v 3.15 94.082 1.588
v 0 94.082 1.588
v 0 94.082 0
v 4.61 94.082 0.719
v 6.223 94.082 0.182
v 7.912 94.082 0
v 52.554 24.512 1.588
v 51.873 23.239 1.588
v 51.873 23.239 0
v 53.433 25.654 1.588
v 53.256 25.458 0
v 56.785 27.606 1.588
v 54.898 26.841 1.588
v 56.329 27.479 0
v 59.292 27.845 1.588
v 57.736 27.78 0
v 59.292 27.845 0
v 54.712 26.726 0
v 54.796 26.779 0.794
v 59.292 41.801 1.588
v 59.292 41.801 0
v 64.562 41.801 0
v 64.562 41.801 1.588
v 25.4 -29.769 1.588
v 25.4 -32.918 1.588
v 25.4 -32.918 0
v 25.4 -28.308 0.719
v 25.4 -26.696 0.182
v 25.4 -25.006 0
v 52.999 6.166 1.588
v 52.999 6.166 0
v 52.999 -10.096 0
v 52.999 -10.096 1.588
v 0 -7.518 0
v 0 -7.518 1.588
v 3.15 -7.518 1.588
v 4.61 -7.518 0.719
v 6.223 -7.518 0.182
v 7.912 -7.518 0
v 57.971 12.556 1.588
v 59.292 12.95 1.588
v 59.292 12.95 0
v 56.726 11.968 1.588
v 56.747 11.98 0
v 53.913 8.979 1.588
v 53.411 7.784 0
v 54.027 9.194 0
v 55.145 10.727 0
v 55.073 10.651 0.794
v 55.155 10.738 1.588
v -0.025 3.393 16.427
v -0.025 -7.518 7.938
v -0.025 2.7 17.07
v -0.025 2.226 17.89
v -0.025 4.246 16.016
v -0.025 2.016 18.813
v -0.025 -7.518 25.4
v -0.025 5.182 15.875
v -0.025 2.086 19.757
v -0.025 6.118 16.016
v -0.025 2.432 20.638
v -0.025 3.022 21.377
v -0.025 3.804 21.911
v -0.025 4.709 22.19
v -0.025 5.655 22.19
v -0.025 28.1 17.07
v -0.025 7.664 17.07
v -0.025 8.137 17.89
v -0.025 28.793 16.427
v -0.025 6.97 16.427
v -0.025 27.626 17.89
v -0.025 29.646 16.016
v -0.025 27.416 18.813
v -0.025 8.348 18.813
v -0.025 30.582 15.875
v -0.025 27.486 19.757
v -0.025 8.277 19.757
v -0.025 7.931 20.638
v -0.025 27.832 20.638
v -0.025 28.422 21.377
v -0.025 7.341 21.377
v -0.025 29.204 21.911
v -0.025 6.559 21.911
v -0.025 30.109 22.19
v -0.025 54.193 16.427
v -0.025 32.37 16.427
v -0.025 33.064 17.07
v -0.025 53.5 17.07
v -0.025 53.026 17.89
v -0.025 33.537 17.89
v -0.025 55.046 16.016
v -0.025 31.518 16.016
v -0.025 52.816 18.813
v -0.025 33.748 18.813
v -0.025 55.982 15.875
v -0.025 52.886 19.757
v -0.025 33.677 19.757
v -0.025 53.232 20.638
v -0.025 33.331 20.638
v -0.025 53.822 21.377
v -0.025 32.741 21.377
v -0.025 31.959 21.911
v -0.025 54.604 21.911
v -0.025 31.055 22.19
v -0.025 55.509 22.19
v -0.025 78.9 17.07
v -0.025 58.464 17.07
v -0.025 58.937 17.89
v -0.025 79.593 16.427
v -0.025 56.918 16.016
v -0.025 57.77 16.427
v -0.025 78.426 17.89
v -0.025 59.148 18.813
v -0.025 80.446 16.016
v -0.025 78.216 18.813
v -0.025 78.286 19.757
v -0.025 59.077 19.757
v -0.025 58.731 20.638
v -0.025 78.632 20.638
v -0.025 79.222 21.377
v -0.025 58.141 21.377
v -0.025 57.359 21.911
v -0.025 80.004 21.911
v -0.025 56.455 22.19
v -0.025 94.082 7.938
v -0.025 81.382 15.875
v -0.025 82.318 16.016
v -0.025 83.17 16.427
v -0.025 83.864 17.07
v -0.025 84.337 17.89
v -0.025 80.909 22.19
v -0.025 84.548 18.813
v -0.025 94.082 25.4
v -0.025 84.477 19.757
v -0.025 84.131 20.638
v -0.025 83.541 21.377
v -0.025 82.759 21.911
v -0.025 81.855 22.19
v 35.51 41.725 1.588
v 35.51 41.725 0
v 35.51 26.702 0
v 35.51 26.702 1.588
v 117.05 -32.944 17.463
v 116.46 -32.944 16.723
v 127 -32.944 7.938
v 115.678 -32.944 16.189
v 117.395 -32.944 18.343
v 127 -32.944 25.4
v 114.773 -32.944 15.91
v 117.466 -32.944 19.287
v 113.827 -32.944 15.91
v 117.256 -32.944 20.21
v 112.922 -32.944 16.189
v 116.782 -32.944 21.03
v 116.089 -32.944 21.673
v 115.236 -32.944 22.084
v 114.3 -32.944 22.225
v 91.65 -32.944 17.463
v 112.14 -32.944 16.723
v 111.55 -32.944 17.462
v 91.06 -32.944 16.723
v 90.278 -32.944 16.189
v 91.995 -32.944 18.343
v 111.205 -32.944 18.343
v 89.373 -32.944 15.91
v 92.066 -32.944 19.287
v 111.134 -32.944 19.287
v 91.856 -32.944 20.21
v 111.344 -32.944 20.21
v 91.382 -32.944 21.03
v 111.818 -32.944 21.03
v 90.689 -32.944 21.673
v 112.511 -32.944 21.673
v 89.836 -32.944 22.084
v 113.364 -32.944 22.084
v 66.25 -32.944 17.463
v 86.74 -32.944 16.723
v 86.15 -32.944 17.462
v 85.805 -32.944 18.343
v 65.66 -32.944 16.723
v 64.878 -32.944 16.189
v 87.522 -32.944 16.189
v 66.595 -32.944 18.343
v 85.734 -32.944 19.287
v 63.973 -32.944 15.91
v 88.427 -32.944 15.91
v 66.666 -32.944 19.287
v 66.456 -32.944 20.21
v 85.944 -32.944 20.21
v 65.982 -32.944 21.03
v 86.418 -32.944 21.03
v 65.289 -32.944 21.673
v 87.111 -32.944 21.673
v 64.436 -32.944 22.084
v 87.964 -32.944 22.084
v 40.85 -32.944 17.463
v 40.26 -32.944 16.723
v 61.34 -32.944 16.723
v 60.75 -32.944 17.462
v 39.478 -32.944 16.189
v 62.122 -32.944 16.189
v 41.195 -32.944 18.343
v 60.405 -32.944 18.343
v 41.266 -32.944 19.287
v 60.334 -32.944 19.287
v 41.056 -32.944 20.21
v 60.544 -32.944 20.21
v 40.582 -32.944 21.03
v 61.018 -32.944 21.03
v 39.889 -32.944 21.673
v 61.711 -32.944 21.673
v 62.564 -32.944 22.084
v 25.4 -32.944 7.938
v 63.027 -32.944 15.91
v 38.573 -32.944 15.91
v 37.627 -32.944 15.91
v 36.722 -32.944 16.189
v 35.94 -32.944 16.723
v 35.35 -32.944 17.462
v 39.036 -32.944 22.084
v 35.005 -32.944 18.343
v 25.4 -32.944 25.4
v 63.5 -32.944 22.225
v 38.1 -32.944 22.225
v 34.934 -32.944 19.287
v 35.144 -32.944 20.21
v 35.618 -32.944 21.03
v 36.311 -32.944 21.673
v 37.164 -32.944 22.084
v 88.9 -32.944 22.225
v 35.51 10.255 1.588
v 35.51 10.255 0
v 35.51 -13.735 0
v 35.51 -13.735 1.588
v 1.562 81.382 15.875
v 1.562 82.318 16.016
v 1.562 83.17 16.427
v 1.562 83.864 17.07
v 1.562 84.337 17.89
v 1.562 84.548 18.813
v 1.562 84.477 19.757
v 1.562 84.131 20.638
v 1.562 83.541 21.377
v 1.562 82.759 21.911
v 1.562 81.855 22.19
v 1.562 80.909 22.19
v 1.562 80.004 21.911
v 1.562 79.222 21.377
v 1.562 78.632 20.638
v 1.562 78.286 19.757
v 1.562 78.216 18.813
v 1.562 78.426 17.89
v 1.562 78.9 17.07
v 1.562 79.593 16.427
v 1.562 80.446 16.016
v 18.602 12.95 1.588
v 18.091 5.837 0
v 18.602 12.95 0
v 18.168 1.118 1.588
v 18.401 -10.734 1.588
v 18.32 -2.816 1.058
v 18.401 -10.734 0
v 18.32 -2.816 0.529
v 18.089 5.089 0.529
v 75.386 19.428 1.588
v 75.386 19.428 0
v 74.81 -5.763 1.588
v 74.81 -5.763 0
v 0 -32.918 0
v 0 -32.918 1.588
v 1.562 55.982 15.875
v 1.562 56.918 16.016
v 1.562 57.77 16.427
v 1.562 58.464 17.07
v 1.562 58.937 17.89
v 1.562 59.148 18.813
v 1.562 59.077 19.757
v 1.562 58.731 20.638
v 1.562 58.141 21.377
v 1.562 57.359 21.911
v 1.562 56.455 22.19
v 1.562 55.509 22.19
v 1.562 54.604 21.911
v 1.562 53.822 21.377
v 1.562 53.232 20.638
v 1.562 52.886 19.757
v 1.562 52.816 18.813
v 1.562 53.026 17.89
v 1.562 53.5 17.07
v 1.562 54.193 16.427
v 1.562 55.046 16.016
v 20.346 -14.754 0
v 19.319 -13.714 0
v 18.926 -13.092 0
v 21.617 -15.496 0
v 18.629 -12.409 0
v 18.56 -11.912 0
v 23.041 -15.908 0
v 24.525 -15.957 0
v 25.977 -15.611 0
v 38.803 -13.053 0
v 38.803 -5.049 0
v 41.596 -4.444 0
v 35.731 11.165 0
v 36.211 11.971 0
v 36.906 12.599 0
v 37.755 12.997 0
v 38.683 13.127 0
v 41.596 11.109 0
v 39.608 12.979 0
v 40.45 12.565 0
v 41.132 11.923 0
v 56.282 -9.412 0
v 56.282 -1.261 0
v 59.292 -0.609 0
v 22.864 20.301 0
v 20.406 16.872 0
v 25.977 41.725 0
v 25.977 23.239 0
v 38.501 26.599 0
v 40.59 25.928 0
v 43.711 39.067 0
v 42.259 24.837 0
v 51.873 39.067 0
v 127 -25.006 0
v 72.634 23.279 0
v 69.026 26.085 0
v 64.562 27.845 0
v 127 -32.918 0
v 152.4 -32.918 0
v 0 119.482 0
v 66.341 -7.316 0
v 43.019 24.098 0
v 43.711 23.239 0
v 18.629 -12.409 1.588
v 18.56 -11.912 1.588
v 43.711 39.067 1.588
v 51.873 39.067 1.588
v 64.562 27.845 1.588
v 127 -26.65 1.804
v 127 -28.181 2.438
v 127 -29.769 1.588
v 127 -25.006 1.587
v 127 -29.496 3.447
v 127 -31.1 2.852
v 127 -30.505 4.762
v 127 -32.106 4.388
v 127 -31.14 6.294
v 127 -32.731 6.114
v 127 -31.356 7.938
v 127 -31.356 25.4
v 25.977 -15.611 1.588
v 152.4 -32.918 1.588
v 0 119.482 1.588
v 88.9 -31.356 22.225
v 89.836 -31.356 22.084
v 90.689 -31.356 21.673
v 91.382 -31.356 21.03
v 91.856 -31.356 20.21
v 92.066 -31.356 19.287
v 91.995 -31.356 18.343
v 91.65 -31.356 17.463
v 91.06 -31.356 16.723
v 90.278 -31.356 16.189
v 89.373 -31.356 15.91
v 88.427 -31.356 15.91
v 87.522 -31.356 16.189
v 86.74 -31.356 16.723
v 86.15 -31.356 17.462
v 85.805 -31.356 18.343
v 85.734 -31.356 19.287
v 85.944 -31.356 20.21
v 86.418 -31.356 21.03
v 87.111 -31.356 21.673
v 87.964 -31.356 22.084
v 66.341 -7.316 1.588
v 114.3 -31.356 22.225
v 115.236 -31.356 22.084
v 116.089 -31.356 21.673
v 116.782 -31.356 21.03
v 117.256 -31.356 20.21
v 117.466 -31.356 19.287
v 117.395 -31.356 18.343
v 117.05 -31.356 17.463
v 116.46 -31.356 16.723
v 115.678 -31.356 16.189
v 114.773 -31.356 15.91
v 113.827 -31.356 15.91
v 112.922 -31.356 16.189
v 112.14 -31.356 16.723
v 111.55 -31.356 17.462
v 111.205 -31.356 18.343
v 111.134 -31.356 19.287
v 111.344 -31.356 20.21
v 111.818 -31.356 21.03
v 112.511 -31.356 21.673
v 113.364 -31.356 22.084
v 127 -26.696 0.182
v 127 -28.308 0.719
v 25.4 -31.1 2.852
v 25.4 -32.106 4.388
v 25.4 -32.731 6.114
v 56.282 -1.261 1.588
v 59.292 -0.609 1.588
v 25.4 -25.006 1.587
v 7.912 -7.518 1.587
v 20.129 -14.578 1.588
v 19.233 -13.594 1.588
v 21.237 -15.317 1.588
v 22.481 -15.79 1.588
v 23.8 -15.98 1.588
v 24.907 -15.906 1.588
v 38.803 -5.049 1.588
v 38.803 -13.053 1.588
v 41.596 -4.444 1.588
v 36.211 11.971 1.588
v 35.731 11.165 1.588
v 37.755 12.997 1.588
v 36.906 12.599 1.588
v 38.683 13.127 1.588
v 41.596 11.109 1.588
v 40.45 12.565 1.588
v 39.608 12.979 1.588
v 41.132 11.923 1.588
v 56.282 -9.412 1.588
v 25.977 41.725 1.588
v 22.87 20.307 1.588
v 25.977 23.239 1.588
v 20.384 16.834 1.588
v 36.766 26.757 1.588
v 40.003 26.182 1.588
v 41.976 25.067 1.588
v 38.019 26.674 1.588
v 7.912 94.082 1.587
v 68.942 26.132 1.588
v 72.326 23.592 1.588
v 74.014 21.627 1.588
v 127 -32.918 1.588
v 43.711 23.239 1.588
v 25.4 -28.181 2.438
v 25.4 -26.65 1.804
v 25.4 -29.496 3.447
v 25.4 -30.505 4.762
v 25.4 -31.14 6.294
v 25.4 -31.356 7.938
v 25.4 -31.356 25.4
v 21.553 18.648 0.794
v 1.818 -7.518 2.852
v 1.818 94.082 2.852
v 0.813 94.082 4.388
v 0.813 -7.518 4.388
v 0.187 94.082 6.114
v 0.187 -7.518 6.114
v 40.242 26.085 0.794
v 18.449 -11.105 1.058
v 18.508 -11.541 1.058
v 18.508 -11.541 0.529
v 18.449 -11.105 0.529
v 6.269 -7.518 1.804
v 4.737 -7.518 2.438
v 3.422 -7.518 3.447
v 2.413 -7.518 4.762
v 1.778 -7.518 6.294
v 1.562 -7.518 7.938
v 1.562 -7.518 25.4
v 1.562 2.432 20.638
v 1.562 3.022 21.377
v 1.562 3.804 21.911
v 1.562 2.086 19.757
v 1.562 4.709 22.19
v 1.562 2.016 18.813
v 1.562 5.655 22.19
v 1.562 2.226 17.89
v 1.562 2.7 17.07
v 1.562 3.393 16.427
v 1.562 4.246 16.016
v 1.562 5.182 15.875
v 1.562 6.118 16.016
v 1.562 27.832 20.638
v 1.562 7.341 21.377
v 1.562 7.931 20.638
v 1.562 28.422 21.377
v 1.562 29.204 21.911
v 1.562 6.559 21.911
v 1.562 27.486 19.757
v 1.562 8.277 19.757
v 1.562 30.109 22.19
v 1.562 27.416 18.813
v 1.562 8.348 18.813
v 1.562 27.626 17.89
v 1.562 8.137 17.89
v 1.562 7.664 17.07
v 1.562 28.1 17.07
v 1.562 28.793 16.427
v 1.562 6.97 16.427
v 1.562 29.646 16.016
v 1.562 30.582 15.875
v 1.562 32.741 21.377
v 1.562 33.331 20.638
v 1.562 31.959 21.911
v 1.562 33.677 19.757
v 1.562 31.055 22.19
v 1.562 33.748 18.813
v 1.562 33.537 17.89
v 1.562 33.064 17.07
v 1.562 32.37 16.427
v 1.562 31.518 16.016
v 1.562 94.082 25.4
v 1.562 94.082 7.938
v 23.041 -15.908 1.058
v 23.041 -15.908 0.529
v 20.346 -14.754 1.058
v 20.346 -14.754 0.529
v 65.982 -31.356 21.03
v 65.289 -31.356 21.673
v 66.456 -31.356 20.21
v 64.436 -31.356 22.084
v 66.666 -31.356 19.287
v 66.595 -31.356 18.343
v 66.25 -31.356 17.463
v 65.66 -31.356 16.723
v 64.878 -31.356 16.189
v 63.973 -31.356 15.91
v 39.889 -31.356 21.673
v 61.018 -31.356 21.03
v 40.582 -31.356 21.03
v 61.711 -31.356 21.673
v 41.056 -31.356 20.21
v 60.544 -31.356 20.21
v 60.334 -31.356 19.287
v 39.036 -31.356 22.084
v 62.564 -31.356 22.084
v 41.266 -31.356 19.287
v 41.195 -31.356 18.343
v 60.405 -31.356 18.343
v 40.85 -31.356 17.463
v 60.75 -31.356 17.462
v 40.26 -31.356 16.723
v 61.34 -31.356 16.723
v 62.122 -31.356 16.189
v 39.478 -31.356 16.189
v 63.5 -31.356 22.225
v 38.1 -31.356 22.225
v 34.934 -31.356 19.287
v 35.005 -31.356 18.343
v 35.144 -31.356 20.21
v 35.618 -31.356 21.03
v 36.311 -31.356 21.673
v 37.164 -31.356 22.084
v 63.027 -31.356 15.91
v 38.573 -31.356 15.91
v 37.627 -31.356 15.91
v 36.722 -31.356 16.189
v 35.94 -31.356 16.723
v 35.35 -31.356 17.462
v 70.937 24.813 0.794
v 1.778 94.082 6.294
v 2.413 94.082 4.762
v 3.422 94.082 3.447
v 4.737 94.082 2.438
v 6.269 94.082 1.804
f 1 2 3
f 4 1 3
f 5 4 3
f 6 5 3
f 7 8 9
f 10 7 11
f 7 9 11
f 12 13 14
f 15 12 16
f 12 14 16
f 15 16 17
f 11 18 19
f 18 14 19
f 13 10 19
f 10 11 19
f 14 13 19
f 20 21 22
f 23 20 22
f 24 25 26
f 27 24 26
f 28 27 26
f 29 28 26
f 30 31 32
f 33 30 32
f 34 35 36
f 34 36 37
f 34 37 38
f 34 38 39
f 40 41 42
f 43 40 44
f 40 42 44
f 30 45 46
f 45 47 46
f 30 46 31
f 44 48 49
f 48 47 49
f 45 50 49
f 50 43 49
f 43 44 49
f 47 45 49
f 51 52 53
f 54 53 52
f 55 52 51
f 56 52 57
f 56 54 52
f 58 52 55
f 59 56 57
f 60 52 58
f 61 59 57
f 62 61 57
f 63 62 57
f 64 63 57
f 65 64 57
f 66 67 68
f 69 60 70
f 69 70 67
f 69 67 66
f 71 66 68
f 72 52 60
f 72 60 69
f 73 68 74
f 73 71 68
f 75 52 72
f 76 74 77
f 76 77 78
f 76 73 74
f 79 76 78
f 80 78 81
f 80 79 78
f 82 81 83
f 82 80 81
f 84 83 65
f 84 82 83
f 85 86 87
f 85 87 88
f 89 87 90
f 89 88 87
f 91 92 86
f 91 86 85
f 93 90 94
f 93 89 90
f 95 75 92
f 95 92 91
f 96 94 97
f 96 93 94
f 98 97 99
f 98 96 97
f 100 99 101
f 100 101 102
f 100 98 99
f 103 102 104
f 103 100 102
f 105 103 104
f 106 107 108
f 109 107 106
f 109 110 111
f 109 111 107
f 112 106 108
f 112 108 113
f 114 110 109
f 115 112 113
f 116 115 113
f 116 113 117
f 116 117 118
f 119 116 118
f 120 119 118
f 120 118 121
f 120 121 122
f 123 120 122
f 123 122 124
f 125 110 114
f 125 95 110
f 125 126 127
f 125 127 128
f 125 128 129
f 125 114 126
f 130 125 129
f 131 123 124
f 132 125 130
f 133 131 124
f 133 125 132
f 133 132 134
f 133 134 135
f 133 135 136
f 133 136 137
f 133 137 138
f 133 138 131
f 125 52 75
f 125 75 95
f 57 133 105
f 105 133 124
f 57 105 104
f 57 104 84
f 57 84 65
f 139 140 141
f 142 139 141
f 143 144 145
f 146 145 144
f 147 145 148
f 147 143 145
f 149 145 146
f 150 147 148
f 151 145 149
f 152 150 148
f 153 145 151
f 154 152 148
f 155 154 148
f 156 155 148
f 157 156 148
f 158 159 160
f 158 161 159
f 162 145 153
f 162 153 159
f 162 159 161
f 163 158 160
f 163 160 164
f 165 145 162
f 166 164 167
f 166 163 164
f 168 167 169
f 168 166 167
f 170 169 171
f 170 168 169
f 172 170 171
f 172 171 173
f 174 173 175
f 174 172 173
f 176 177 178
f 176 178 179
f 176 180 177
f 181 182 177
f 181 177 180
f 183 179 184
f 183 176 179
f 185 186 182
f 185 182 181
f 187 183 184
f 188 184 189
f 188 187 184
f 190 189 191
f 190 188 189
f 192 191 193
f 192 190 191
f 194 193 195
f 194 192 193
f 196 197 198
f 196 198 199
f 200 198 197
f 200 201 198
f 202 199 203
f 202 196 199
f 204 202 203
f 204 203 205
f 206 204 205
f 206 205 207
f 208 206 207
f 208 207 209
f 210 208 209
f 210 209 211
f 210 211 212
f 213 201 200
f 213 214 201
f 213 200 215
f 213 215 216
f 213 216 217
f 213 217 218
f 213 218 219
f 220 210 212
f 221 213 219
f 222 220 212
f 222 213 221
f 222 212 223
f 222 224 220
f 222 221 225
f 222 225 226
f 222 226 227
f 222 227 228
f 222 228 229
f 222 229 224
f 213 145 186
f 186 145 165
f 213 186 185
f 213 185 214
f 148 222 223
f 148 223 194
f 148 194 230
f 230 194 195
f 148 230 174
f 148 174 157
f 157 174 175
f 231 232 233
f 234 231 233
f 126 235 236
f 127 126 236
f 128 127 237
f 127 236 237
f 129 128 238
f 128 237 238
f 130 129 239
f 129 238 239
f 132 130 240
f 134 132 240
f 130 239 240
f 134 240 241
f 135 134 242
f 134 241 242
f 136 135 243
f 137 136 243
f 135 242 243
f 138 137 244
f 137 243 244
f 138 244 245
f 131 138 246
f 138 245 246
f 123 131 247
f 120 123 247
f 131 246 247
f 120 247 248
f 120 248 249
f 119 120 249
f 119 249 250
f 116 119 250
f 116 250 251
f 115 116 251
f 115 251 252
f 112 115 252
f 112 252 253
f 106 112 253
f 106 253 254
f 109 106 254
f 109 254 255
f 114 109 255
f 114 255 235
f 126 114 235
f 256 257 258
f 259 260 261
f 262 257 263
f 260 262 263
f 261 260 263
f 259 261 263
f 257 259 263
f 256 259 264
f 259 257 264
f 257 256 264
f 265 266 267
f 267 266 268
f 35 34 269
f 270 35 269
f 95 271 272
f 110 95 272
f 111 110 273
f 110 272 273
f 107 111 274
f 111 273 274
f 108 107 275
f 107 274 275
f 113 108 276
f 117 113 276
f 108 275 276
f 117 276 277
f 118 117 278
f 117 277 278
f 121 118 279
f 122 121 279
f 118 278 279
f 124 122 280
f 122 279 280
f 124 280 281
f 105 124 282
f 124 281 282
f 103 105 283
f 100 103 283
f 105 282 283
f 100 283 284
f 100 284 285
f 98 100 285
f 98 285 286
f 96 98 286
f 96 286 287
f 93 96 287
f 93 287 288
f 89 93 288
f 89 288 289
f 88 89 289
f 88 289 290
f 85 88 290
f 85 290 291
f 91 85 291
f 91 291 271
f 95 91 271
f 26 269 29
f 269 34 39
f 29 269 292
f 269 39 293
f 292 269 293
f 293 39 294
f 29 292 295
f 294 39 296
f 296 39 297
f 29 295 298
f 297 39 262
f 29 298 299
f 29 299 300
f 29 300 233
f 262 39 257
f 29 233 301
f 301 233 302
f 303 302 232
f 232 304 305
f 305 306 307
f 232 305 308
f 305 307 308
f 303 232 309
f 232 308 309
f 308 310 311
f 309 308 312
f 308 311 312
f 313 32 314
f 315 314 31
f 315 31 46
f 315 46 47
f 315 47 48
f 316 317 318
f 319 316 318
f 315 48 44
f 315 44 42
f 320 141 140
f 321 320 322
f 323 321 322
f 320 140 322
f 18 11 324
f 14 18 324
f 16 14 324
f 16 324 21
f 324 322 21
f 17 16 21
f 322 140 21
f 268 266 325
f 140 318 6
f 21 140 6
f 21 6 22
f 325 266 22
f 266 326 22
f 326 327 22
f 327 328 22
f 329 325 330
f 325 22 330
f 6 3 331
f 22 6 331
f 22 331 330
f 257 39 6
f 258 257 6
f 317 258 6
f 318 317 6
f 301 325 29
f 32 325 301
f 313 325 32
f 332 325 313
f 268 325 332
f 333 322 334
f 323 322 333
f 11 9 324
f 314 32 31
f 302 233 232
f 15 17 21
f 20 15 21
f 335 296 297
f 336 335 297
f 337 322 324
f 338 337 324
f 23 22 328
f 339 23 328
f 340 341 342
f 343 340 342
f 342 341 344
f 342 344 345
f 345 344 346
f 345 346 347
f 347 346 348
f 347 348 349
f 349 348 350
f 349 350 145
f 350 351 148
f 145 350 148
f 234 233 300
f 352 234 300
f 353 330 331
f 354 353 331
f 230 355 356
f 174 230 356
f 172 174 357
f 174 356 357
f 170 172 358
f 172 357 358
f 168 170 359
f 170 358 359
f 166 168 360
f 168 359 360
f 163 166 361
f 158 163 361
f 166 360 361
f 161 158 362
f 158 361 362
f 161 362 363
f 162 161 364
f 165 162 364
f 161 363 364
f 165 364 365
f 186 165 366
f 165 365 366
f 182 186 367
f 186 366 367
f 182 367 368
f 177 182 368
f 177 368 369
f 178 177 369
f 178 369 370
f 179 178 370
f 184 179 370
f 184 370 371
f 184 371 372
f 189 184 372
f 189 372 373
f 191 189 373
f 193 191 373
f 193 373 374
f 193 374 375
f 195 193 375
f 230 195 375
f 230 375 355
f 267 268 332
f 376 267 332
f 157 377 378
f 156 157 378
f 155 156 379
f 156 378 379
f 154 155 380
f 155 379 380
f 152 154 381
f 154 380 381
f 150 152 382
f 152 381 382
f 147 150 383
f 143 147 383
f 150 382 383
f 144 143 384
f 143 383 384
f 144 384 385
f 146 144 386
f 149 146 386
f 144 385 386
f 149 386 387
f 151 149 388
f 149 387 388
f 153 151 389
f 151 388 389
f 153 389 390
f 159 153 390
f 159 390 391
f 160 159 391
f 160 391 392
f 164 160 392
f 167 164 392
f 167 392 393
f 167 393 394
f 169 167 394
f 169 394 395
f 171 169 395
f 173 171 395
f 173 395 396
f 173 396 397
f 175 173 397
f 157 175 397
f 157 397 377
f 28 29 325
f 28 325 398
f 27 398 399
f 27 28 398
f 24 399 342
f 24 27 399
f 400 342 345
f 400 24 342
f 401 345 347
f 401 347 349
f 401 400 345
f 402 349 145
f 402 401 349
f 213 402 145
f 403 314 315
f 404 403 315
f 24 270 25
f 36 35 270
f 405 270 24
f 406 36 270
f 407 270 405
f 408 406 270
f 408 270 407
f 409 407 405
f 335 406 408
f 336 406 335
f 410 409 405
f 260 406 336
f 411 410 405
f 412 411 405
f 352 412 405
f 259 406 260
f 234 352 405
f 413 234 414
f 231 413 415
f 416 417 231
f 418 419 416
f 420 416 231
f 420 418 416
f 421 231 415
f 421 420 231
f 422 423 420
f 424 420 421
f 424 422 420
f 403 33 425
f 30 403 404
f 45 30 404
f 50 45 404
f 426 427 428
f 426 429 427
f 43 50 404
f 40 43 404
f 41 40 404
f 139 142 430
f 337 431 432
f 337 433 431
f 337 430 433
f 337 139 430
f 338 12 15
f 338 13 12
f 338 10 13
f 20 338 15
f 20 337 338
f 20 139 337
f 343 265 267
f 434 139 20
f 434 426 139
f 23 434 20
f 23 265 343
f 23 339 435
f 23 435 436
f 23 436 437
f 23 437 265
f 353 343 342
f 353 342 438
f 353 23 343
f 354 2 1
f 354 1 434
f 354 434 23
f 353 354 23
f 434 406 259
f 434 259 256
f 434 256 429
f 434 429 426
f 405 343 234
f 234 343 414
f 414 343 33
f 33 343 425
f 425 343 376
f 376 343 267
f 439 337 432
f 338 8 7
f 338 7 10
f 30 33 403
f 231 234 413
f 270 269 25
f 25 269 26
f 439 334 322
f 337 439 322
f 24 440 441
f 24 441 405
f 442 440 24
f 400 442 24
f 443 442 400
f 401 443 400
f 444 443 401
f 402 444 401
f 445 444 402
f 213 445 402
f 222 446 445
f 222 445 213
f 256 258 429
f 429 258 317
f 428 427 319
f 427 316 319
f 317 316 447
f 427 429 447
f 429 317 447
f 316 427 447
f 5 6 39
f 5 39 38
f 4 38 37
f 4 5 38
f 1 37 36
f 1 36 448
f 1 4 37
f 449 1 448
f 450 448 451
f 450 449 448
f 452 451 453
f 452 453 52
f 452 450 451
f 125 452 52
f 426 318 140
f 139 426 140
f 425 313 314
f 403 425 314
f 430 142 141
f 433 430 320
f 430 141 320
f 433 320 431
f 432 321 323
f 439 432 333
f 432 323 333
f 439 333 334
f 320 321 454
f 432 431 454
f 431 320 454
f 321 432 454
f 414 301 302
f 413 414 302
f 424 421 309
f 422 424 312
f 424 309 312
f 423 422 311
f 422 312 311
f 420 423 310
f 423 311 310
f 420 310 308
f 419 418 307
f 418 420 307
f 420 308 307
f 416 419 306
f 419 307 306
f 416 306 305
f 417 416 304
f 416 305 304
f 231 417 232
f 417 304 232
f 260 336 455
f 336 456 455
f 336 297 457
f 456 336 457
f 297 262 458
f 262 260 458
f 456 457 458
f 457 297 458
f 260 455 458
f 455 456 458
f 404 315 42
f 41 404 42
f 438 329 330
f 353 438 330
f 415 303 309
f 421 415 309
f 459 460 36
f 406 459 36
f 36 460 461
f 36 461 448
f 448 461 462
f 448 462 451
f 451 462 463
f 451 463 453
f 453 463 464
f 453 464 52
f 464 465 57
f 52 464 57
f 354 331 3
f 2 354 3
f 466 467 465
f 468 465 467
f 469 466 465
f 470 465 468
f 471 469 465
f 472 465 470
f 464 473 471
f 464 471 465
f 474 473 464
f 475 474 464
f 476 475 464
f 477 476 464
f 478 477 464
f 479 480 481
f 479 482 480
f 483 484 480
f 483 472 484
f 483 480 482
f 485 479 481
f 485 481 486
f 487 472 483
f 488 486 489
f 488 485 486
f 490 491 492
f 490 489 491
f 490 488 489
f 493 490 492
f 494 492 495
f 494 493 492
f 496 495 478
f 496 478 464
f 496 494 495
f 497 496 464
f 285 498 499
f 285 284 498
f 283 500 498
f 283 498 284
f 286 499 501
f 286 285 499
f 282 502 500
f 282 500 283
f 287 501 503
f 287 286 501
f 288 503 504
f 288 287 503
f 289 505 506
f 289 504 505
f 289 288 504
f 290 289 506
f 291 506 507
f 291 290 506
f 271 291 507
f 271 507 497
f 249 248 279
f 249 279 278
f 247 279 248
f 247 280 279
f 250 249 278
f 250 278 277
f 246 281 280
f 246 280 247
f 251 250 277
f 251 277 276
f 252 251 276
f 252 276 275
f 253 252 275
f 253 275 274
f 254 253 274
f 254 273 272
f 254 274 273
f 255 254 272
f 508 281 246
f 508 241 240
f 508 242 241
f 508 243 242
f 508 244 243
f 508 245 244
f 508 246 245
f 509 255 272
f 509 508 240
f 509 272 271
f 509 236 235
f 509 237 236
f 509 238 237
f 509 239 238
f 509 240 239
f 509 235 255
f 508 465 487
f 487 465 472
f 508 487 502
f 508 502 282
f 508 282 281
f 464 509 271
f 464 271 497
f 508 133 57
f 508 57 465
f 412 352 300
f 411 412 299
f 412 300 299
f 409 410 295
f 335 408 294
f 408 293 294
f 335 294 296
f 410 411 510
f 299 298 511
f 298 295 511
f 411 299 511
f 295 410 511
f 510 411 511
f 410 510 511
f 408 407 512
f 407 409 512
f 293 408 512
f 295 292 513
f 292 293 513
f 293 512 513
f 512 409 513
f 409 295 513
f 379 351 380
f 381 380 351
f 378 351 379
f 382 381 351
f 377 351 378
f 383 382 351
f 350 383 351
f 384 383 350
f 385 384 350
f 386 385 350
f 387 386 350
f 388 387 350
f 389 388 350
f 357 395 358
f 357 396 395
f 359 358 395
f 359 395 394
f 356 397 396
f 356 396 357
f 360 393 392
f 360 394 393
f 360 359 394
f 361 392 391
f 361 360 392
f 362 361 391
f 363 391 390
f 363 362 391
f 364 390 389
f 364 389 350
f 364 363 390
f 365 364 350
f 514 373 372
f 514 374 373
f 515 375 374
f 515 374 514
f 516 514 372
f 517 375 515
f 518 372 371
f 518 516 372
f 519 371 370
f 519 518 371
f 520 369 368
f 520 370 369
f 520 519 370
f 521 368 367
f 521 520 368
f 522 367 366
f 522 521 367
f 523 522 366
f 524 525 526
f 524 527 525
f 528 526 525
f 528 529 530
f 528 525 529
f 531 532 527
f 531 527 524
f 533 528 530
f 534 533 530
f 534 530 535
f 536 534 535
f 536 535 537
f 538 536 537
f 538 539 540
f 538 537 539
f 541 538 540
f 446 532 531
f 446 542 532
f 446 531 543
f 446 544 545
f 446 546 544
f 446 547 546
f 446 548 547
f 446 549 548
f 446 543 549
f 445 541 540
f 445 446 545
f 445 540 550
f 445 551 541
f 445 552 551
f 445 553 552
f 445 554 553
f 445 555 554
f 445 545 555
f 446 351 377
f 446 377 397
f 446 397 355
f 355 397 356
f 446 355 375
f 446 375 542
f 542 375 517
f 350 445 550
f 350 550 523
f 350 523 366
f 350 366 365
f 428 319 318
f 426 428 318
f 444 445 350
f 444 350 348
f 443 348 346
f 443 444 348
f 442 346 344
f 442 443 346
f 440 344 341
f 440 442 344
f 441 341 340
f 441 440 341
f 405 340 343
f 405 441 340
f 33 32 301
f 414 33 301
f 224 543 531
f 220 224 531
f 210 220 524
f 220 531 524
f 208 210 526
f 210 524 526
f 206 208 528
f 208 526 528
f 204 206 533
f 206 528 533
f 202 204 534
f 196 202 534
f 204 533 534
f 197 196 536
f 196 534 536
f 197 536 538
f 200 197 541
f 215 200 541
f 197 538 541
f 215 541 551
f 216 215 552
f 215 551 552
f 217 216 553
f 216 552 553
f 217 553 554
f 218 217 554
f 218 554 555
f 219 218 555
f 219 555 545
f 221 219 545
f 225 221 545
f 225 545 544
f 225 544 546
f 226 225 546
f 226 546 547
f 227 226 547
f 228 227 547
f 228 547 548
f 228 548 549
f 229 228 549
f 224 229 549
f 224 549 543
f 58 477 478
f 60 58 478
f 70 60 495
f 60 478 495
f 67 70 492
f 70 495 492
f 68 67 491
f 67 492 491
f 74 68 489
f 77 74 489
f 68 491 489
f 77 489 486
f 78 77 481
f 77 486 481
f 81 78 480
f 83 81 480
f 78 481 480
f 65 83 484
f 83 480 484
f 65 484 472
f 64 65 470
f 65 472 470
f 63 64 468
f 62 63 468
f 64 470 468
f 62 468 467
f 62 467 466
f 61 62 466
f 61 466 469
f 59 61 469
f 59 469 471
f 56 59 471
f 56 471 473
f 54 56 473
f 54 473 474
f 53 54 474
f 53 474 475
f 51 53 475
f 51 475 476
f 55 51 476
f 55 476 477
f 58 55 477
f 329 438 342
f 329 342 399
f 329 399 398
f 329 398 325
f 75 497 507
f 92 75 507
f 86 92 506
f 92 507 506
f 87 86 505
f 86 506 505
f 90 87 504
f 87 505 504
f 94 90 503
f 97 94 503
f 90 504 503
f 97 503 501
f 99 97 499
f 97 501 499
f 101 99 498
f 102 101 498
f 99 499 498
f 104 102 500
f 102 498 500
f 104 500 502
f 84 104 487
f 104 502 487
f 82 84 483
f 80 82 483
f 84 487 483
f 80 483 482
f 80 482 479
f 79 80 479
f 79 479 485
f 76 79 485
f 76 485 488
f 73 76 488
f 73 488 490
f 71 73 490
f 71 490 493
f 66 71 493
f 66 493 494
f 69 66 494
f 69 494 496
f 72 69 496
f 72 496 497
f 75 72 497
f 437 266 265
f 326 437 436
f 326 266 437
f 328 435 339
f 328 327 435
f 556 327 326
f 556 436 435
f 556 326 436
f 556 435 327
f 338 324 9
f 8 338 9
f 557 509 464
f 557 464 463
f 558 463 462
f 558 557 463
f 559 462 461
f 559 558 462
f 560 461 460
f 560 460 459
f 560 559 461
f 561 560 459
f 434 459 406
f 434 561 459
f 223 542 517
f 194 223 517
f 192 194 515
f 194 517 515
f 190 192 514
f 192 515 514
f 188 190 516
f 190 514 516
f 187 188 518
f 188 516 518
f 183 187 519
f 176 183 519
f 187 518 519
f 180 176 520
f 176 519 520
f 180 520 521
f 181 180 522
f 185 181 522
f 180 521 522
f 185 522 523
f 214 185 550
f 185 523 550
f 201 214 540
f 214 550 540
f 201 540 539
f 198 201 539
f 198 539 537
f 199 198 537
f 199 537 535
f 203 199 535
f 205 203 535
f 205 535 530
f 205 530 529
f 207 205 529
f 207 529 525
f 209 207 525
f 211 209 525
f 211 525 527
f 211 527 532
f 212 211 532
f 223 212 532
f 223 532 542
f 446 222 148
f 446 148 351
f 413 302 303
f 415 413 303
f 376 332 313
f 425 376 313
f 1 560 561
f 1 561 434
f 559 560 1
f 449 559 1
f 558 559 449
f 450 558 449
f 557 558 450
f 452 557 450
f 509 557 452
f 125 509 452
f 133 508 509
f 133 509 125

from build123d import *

# Parameters (mm, degrees)
BOSS_EXTRUDE1_DEPTH          = 1.5875
SKETCH7_W                    = 1.5875
SKETCH7_H                    = 101.6
BOSS_EXTRUDE2_DEPTH          = 0.0254
EDGE_FLANGE1_STRIP_W         = 19.05
EDGE_FLANGE1_STRIP_H         = 1.5875
EDGE_FLANGE1_STRIP_CUT_DEPTH = 101.6
EDGE_FLANGE1_DEPTH           = 101.6
SKETCH11_W                   = 101.6
SKETCH11_H                   = 1.5875
BOSS_EXTRUDE3_DEPTH          = 0.0254
EDGE_FLANGE2_STRIP_W         = 19.05
EDGE_FLANGE2_STRIP_H         = 1.5875
EDGE_FLANGE2_STRIP_CUT_DEPTH = 101.6
EDGE_FLANGE2_DEPTH           = 101.6
SKETCH15_R                   = 3.175
CUT_EXTRUDE1_DEPTH           = 2.54
SKETCH16_R                   = 3.175
CUT_EXTRUDE2_DEPTH           = 2.54
CUT_EXTRUDE4_DEPTH           = 2.54


# Sheet-metal steps are written as plain solids
with BuildPart() as part:
    # Sketch1 → Boss-Extrude1 (new body)
    with BuildSketch(Plane.XY):
        Polygon((0, 119.481843199), (0, -32.918156801), (152.4, -32.918156801), align=None)
    extrude(amount=BOSS_EXTRUDE1_DEPTH)

    # Sketch7 → Boss-Extrude2 (add)
    with BuildSketch(Plane.ZY):
        with Locations((0.79375, 43.281843199)):
            Rectangle(SKETCH7_W, SKETCH7_H)
    extrude(amount=BOSS_EXTRUDE2_DEPTH)

    # Edge-Flange1 strip (across the edge) → Edge-Flange1 strip cut (cut)
    with BuildSketch(Plane(origin=(-0.0254, 94.081843199, 1.5875), x_dir=(1, 0, 0), z_dir=(0, -1, 0))):
        with Locations((-1.5875, -0.79375)):
            Rectangle(EDGE_FLANGE1_STRIP_W, EDGE_FLANGE1_STRIP_H)
    extrude(amount=EDGE_FLANGE1_STRIP_CUT_DEPTH, mode=Mode.SUBTRACT)

    # Edge-Flange1 section (across the edge) → Edge-Flange1 (add)
    with BuildSketch(Plane(origin=(-0.0254, 94.081843199, 1.5875), x_dir=(1, 0, 0), z_dir=(0, -1, 0))):
        with BuildLine():
            Line((0, 6.35), (0, 23.8125))
            Line((0, 23.8125), (1.5875, 23.8125))
            Line((1.5875, 23.8125), (1.5875, 6.35))
            ThreePointArc((1.5875, 6.35), (3.447371939, 1.859871939), (7.9375, 0))
            Line((7.9375, 0), (7.9375, -1.5875))
            ThreePointArc((7.9375, -1.5875), (2.324839924, 0.737339924), (0, 6.35))
        make_face()
    extrude(amount=EDGE_FLANGE1_DEPTH)

    # Sketch11 → Boss-Extrude3 (add)
    with BuildSketch(Plane(origin=(0, -32.918156801, 0), x_dir=(-1, 0, 0), z_dir=(0, -1, 0))):
        with Locations((-76.2, -0.79375)):
            Rectangle(SKETCH11_W, SKETCH11_H)
    extrude(amount=BOSS_EXTRUDE3_DEPTH)

    # Edge-Flange2 strip (across the edge) → Edge-Flange2 strip cut (cut)
    with BuildSketch(Plane(origin=(25.4, -32.943556801, 1.5875), x_dir=(0, 1, 0), z_dir=(1, 0, 0))):
        with Locations((-1.5875, -0.79375)):
            Rectangle(EDGE_FLANGE2_STRIP_W, EDGE_FLANGE2_STRIP_H)
    extrude(amount=EDGE_FLANGE2_STRIP_CUT_DEPTH, mode=Mode.SUBTRACT)

    # Edge-Flange2 section (across the edge) → Edge-Flange2 (add)
    with BuildSketch(Plane(origin=(25.4, -32.943556801, 1.5875), x_dir=(0, 1, 0), z_dir=(1, 0, 0))):
        with BuildLine():
            Line((0, 6.35), (0, 23.8125))
            Line((0, 23.8125), (1.5875, 23.8125))
            Line((1.5875, 23.8125), (1.5875, 6.35))
            ThreePointArc((1.5875, 6.35), (3.447371939, 1.859871939), (7.9375, 0))
            Line((7.9375, 0), (7.9375, -1.5875))
            ThreePointArc((7.9375, -1.5875), (2.324839924, 0.737339924), (0, 6.35))
        make_face()
    extrude(amount=EDGE_FLANGE2_DEPTH)

    # Sketch15 → Cut-Extrude1 (cut)
    with BuildSketch(Plane(origin=(0, -31.356056801, 0), x_dir=(1, 0, 0), z_dir=(0, 1, 0))):
        with Locations(Location((38.1, -19.05, 0), (0, 0, 270))):
            Circle(SKETCH15_R)
        with Locations(Location((63.5, -19.05, 0), (0, 0, 270))):
            Circle(SKETCH15_R)
        with Locations(Location((88.9, -19.05, 0), (0, 0, 270))):
            Circle(SKETCH15_R)
        with Locations(Location((114.3, -19.05, 0), (0, 0, 270))):
            Circle(SKETCH15_R)
    extrude(amount=-CUT_EXTRUDE1_DEPTH, mode=Mode.SUBTRACT)

    # Sketch16 → Cut-Extrude2 (cut)
    with BuildSketch(Plane(origin=(1.5621, 0, 0), x_dir=(0, 0, -1), z_dir=(1, 0, 0))):
        with Locations((-19.05, 81.381843199)):
            Circle(SKETCH16_R)
        with Locations((-19.05, 55.981843199)):
            Circle(SKETCH16_R)
        with Locations((-19.05, 30.581843199)):
            Circle(SKETCH16_R)
        with Locations((-19.05, 5.181843199)):
            Circle(SKETCH16_R)
    extrude(amount=-CUT_EXTRUDE2_DEPTH, mode=Mode.SUBTRACT)

    # Sketch17 → Cut-Extrude4 (cut)
    with BuildSketch(Plane(origin=(0, 0, 0), x_dir=(-1, 0, 0), z_dir=(0, 0, -1))):
        with BuildLine():
            add(Edge.make_bspline(
                [(-18.559829118, -11.912329653), (-18.517563518, -11.616470453), (-18.438315518, -11.030035253), (-18.401333118, -10.734176053)],
                knots=[0, 0, 0, 0, 1, 1, 1, 1], degree=3))
            add(Edge.make_bspline(
                [(-18.401333118, -10.734176053), (-18.691909118, -2.819942453), (-17.418657918, 5.120707147), (-18.602094718, 12.950409547)],
                knots=[0, 0, 0, 0, 1, 1, 1, 1], degree=3))
            add(Edge.make_bspline(
                [(-18.602094718, 12.950409547), (-20.817014275, 19.201191532), (-25.977441918, 23.238769538)],
                knots=[0, 0, 0, 1, 1, 1], degree=2))
            Line((-25.977441918, 23.238769538), (-25.977441918, 41.725320732))
            Line((-25.977441918, 41.725320732), (-35.509588786, 41.725320732))
            Line((-35.509588786, 41.725320732), (-35.509588786, 26.702452856))
            add(Edge.make_bspline(
                [(-35.509588786, 26.702452856), (-40.874741805, 27.199220364), (-43.710628887, 23.238769538)],
                knots=[0, 0, 0, 1, 1, 1], degree=2))
            Line((-43.710628887, 23.238769538), (-43.710628887, 39.06666413))
            Line((-43.710628887, 39.06666413), (-51.873392585, 39.06666413))
            Line((-51.873392585, 39.06666413), (-51.873392585, 23.238769538))
            add(Edge.make_bspline(
                [(-51.873392585, 23.238769538), (-54.008947234, 28.015586517), (-59.291846155, 27.844961118)],
                knots=[0, 0, 0, 1, 1, 1], degree=2))
            Line((-59.291846155, 27.844961118), (-59.291846155, 41.800648781))
            Line((-59.291846155, 41.800648781), (-64.561793613, 41.800648781))
            Line((-64.561793613, 41.800648781), (-64.561793613, 27.844961118))
            add(Edge.make_bspline(
                [(-75.385928318, 19.427612747), (-71.900151449, 25.9887548), (-64.561793613, 27.844961118)],
                knots=[0, 0, 0, 1, 1, 1], degree=2))
            Line((-75.385928318, 19.427612747), (-74.810059518, -5.762684853))
            Line((-74.810059518, -5.762684853), (-66.341089918, -7.315945653))
            Line((-66.341089918, -7.315945653), (-56.281940787, -9.411792826))
            Line((-56.281940787, -9.411792826), (-56.281940787, -1.261313945))
            Line((-56.281940787, -1.261313945), (-59.291846155, -0.609067129))
            Line((-59.291846155, -0.609067129), (-59.291846155, 12.950409547))
            add(Edge.make_bspline(
                [(-59.291846155, 12.950409547), (-54.000334372, 11.743104523), (-52.999057908, 6.165627848)],
                knots=[0, 0, 0, 1, 1, 1], degree=2))
            Line((-52.999057908, 6.165627848), (-52.999057908, -1.972715017))
            Line((-52.999057908, -1.972715017), (-52.999057908, -10.095789128))
            Line((-52.999057908, -10.095789128), (-38.803453862, -13.053476327))
            Line((-38.803453862, -13.053476327), (-38.803453862, -5.048903937))
            Line((-38.803453862, -5.048903937), (-41.596172219, -4.44372157))
            Line((-41.596172219, -4.44372157), (-41.596172219, 11.108656065))
            ThreePointArc((-41.596172219, 11.108656065), (-38.214050979, 13.096353593), (-35.509588786, 10.254598891))
            Line((-35.509588786, 10.254598891), (-35.509588786, -5.762684853))
            Line((-35.509588786, -5.762684853), (-35.509588786, -13.734915973))
            Line((-35.509588786, -13.734915973), (-25.977441918, -15.610569653))
            add(Edge.make_bspline(
                [(-25.977441918, -15.610569653), (-23.166779518, -16.720041653), (-19.611185918, -15.261878453), (-18.628510718, -12.408950453)],
                knots=[0, 0, 0, 0, 1, 1, 1, 1], degree=3))
            Line((-18.628510718, -12.408950453), (-18.559829118, -11.912329653))
        make_face()
    extrude(amount=-CUT_EXTRUDE4_DEPTH, mode=Mode.SUBTRACT)


solid = part.part
